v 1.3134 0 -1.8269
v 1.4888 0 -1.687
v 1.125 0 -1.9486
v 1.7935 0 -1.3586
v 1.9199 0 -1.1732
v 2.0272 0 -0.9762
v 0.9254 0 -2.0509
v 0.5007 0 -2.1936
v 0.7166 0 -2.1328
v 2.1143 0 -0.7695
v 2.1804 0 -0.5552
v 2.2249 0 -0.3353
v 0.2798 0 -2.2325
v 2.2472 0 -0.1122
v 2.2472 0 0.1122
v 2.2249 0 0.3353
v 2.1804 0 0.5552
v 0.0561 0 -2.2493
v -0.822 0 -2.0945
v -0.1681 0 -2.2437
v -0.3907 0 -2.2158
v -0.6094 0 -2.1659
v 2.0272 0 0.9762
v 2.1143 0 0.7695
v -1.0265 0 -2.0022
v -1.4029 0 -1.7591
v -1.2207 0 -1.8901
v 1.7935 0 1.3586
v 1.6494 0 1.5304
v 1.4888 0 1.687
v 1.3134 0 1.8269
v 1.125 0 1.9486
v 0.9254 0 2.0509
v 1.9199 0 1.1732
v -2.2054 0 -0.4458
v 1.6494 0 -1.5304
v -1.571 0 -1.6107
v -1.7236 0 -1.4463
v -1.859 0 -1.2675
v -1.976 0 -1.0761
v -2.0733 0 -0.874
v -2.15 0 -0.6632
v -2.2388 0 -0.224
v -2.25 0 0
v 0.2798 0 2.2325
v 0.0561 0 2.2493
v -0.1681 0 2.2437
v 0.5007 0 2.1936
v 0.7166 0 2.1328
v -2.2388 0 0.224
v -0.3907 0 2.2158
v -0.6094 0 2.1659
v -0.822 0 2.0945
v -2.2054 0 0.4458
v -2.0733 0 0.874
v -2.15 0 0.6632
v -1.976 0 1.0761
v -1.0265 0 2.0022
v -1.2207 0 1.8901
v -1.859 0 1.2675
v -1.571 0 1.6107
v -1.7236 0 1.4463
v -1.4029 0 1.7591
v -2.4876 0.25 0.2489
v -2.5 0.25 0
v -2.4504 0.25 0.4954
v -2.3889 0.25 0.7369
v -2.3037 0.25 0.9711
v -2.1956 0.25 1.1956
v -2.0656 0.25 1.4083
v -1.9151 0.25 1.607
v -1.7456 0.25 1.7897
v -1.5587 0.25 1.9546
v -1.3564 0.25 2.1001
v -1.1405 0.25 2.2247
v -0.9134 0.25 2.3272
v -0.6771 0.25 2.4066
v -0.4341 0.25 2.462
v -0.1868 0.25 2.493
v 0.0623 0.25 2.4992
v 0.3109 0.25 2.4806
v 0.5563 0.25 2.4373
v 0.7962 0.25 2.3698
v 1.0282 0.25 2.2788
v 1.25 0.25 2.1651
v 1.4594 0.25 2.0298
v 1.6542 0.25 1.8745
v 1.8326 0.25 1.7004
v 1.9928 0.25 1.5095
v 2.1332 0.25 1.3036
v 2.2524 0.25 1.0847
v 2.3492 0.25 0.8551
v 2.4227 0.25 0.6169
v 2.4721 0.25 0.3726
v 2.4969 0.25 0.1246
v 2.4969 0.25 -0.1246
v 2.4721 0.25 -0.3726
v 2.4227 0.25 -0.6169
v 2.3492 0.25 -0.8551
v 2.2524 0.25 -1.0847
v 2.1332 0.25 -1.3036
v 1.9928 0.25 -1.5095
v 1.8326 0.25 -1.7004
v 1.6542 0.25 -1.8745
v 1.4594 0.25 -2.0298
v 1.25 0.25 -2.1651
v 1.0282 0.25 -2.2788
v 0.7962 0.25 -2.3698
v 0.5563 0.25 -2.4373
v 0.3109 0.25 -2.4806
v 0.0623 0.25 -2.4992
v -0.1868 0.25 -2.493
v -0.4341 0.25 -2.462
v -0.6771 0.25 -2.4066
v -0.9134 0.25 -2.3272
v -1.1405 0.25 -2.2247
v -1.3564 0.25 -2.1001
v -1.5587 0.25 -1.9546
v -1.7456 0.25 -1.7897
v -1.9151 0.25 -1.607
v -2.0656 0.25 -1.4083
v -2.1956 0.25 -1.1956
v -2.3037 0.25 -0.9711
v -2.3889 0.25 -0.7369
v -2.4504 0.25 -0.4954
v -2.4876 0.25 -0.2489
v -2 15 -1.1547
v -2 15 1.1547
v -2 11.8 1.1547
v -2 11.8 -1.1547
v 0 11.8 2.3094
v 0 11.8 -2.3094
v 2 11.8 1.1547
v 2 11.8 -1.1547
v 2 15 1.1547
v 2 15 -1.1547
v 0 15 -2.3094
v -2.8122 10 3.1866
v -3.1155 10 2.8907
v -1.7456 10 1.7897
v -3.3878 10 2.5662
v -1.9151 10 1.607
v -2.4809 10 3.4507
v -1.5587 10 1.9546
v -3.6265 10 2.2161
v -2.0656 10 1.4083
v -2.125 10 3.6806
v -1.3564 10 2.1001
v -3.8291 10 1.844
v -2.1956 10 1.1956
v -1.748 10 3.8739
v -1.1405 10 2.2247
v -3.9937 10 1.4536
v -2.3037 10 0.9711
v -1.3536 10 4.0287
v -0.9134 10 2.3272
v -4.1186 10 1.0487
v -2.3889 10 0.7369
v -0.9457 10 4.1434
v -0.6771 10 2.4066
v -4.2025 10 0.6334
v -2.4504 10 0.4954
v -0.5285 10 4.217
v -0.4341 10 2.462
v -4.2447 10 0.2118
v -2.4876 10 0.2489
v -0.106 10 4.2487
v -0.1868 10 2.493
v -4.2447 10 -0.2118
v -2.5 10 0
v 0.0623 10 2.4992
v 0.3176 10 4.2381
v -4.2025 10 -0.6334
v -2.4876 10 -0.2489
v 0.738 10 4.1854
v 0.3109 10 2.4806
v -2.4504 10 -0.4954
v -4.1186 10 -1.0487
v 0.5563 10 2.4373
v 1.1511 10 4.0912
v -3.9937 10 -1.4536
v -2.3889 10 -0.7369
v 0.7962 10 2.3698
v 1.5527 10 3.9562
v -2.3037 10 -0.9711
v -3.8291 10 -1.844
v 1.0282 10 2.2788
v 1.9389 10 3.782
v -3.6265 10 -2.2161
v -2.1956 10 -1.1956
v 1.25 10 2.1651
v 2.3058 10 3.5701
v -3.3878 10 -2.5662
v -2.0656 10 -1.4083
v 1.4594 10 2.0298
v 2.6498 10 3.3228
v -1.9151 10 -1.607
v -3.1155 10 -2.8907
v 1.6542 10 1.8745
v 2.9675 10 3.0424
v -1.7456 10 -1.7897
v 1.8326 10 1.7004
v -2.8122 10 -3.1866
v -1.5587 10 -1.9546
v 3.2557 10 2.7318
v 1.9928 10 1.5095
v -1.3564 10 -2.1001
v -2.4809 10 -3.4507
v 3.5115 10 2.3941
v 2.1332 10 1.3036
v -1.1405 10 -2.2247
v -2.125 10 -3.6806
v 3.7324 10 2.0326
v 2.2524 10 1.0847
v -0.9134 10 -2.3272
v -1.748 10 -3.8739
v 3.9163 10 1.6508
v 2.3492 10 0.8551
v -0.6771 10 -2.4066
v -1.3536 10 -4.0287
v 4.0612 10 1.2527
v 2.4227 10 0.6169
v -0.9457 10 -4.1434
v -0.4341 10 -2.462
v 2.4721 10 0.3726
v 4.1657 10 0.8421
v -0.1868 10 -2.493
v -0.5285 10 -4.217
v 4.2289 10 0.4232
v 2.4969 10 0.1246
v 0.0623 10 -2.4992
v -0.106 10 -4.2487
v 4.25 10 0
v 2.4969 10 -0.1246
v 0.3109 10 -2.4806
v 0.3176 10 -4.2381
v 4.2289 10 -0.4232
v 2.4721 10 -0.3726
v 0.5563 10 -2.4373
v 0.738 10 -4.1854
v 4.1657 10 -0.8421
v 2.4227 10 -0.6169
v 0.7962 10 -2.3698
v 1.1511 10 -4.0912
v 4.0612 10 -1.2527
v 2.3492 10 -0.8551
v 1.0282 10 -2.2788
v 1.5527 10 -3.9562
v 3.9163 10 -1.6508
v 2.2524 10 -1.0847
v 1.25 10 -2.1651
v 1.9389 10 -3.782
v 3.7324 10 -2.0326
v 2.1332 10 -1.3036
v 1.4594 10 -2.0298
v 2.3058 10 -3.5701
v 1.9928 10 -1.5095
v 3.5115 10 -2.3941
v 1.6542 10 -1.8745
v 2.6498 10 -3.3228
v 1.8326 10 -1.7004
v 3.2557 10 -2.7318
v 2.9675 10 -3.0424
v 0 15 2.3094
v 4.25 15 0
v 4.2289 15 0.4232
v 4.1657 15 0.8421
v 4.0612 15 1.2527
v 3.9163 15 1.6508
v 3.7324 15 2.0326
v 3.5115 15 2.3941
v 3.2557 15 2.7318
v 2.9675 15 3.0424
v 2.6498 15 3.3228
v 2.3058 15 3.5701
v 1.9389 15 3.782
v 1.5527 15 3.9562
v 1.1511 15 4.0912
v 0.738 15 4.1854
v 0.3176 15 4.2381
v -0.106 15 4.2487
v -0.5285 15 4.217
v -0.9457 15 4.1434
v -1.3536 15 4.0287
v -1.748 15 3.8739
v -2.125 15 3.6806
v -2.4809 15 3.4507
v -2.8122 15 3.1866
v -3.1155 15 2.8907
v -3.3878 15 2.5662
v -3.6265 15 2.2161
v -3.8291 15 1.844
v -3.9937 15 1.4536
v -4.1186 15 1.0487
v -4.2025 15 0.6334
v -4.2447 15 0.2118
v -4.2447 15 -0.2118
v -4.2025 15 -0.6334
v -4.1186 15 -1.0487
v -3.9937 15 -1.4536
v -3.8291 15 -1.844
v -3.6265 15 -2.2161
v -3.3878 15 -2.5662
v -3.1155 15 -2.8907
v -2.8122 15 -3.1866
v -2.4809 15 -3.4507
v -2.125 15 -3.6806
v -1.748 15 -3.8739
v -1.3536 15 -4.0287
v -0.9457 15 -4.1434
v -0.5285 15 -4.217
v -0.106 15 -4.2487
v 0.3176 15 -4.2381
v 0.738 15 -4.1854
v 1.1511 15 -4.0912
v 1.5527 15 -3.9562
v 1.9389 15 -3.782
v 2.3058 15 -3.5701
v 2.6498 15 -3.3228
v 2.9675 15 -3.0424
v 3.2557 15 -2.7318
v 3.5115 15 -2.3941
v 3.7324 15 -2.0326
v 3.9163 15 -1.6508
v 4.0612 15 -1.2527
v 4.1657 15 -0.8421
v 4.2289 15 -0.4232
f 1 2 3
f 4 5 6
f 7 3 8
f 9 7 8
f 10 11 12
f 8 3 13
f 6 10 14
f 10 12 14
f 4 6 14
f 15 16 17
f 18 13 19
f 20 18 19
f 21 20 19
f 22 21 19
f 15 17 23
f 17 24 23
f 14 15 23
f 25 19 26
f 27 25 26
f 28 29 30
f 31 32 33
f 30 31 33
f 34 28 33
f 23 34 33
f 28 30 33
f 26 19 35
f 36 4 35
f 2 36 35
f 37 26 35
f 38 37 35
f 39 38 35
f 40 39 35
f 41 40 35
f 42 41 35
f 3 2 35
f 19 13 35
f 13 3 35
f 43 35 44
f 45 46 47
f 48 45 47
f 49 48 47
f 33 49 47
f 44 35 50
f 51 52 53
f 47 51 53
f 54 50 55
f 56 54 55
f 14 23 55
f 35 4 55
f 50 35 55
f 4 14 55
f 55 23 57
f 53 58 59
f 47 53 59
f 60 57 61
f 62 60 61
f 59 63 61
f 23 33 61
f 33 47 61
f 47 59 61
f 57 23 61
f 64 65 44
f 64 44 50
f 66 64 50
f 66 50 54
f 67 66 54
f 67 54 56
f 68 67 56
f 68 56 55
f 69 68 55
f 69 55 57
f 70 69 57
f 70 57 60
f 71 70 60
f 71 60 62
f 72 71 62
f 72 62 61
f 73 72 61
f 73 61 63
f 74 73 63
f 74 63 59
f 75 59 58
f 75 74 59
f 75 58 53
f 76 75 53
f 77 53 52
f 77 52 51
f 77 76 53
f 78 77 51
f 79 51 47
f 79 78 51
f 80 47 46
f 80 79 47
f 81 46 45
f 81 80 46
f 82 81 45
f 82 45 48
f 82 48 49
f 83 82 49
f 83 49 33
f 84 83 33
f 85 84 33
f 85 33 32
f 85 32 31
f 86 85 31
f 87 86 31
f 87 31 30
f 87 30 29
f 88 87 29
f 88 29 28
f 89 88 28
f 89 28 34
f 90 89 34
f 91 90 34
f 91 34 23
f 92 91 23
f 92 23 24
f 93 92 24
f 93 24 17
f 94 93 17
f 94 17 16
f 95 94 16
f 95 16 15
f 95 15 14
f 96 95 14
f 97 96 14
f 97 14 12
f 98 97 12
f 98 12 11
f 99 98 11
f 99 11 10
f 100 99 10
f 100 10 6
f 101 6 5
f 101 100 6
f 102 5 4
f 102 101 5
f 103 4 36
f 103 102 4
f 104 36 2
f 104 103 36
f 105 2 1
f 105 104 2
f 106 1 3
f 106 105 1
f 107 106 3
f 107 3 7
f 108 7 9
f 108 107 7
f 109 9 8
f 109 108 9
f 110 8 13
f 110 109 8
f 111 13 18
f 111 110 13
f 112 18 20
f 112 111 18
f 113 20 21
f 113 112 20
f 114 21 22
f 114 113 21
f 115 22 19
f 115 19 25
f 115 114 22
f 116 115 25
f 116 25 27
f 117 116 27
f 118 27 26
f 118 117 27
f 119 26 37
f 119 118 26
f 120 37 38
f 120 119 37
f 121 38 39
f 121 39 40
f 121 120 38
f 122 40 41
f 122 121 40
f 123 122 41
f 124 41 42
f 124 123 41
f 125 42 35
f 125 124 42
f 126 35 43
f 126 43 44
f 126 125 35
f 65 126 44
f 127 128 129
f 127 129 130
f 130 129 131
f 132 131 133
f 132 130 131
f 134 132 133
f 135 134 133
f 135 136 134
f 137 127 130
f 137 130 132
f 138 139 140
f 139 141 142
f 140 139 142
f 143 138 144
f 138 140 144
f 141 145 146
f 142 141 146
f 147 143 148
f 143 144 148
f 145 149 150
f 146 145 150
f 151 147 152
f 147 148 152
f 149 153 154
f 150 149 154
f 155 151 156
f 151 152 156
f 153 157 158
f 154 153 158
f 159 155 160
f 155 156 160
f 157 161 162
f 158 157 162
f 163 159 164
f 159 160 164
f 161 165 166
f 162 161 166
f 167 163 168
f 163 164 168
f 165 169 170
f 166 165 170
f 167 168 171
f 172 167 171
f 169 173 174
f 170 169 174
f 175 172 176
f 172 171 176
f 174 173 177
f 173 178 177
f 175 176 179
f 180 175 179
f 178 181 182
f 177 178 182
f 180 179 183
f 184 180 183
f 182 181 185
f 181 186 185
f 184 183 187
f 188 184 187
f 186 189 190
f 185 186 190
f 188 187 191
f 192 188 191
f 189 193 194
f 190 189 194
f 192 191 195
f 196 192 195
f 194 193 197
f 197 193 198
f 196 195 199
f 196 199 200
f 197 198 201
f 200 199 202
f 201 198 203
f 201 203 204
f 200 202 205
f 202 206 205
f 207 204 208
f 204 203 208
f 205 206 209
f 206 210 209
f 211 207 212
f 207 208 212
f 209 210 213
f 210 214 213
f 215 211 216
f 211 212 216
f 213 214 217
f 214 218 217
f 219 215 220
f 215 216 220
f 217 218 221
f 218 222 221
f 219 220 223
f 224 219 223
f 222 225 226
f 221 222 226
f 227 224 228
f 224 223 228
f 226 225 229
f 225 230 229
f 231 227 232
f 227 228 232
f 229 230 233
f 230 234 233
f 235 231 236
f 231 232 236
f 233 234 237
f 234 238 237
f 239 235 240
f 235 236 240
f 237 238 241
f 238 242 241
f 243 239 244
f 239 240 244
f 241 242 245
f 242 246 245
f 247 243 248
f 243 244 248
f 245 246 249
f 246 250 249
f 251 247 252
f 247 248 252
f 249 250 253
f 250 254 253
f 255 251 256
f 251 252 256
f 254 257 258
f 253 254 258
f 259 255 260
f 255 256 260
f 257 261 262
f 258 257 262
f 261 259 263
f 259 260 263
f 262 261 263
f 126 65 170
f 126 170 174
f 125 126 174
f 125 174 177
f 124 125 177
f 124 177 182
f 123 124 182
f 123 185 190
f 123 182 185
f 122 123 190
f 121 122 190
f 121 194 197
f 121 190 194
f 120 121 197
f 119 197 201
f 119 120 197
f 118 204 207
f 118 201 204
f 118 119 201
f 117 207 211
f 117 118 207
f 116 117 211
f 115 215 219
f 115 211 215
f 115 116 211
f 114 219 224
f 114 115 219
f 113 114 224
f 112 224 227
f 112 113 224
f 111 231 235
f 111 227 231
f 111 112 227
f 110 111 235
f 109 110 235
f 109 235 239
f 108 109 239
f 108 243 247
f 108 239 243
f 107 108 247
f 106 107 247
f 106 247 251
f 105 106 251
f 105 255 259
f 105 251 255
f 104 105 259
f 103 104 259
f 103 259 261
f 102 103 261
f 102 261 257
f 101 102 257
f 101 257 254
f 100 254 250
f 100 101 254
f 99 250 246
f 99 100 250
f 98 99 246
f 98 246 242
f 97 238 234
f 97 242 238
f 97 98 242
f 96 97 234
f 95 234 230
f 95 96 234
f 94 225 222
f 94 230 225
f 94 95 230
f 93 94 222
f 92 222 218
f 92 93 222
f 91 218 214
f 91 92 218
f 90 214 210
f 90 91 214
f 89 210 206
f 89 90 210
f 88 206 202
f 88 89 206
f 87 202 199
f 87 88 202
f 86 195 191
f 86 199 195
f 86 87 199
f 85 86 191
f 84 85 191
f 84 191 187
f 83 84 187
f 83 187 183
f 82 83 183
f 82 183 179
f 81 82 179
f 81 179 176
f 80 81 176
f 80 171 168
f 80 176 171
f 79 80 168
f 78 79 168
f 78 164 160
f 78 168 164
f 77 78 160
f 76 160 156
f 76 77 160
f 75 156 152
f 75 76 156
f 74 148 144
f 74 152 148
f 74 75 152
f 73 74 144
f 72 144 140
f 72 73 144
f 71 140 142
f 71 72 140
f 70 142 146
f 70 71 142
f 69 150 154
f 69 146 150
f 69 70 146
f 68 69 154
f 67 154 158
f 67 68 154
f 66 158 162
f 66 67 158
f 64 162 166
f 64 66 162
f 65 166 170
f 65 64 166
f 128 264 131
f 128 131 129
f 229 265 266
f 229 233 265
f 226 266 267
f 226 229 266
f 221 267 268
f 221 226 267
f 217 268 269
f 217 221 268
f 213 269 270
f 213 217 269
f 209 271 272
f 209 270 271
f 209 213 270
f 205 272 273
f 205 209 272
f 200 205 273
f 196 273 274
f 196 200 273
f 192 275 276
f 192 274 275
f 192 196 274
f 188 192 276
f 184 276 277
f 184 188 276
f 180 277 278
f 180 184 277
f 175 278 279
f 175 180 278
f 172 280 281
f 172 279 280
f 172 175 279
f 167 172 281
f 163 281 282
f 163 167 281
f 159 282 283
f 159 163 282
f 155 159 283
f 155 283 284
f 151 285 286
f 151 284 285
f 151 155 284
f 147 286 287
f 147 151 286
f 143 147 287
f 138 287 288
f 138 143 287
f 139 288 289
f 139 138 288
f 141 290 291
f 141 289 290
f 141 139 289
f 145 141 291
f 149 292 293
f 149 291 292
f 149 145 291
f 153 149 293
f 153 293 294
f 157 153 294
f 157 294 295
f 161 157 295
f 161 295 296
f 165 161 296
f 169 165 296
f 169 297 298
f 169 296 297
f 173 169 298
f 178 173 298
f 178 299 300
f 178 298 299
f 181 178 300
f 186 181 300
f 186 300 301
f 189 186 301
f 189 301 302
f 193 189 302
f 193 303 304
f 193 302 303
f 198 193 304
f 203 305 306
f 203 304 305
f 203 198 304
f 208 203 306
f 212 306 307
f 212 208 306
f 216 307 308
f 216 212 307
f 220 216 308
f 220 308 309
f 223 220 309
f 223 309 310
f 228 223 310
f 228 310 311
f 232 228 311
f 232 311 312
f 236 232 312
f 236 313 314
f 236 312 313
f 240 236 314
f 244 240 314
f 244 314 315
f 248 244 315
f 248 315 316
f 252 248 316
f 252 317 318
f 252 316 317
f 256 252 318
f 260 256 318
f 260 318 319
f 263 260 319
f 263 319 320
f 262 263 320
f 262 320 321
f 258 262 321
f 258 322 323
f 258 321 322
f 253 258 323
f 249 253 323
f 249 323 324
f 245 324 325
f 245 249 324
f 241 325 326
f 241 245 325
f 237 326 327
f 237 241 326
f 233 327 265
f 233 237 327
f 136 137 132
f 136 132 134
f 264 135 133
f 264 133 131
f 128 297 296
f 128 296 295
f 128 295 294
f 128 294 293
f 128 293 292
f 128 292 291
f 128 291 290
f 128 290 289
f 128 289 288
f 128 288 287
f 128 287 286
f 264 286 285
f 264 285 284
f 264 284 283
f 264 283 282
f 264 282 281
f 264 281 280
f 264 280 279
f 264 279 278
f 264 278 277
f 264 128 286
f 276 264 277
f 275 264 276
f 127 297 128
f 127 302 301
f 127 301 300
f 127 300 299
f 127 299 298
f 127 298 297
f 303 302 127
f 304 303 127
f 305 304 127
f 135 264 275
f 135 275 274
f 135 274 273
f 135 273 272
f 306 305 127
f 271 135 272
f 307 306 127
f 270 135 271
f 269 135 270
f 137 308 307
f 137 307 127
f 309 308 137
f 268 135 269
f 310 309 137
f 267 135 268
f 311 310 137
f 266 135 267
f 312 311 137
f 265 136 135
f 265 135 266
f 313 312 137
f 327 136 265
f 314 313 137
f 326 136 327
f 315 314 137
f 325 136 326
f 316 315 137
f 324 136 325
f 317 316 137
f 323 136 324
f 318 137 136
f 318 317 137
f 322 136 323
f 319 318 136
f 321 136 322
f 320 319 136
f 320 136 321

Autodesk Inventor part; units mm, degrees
ref_plane "YZ Plane" through (0, 0, 0) normal (1, 0, 0) x (0, 1, 0)
ref_plane "XZ Plane" through (0, 0, 0) normal (0, 1, 0) x (-1, 0, 0)
ref_plane "XY Plane" through (0, 0, 0) normal (0, 0, 1) x (1, 0, 0)
sketch "Sketch1" plane through (0, 0, 0) normal (0, 1, 0) x (-1, 0, 0)
  circle A0 centre (0, 0) radius 2.5
  dimension "d0" = 5
extrude "Extrusion1" add sketch "Sketch1" along normal blind 10
sketch "Sketch2" plane through (0, 10, 0) normal (0, 1, 0) x (1, 0, 0)
  circle A0 centre (0, 0) radius 2.5 projected
  circle A1 centre (0, 0) radius 4.25
  dimension "d3" = 8.5
extrude "Extrusion2" add sketch "Sketch2" along normal blind 5 contours A0 | A1
sketch "Sketch3" plane through (0, 15, 0) normal (0, 1, 0) x (1, 0, 0)
  circle A0 centre (0, 0) radius 4.25 projected
  line L0 (0, 2.3094) -> (2, 1.1547)
  line L1 (2, 1.1547) -> (2, -1.1547)
  line L2 (2, -1.1547) -> (0, -2.3094)
  line L3 (0, -2.3094) -> (-2, -1.1547)
  line L4 (-2, -1.1547) -> (-2, 1.1547)
  line L5 (-2, 1.1547) -> (0, 2.3094)
  dimension "d6" = 2
extrude "Extrusion3" cut sketch "Sketch3" against normal blind 3.2 contours L0 L1 L2 L3 L4 L5
thread "Thread1" size "M5x0.8" class "6g" standard "ANSI Metric M Profile" full length
chamfer "Chamfer1" distance 0.25 angle 45 1 edges at (2.5, 0, 0)
properties part number "M5x10SHCS" material "Stainless Steel"
